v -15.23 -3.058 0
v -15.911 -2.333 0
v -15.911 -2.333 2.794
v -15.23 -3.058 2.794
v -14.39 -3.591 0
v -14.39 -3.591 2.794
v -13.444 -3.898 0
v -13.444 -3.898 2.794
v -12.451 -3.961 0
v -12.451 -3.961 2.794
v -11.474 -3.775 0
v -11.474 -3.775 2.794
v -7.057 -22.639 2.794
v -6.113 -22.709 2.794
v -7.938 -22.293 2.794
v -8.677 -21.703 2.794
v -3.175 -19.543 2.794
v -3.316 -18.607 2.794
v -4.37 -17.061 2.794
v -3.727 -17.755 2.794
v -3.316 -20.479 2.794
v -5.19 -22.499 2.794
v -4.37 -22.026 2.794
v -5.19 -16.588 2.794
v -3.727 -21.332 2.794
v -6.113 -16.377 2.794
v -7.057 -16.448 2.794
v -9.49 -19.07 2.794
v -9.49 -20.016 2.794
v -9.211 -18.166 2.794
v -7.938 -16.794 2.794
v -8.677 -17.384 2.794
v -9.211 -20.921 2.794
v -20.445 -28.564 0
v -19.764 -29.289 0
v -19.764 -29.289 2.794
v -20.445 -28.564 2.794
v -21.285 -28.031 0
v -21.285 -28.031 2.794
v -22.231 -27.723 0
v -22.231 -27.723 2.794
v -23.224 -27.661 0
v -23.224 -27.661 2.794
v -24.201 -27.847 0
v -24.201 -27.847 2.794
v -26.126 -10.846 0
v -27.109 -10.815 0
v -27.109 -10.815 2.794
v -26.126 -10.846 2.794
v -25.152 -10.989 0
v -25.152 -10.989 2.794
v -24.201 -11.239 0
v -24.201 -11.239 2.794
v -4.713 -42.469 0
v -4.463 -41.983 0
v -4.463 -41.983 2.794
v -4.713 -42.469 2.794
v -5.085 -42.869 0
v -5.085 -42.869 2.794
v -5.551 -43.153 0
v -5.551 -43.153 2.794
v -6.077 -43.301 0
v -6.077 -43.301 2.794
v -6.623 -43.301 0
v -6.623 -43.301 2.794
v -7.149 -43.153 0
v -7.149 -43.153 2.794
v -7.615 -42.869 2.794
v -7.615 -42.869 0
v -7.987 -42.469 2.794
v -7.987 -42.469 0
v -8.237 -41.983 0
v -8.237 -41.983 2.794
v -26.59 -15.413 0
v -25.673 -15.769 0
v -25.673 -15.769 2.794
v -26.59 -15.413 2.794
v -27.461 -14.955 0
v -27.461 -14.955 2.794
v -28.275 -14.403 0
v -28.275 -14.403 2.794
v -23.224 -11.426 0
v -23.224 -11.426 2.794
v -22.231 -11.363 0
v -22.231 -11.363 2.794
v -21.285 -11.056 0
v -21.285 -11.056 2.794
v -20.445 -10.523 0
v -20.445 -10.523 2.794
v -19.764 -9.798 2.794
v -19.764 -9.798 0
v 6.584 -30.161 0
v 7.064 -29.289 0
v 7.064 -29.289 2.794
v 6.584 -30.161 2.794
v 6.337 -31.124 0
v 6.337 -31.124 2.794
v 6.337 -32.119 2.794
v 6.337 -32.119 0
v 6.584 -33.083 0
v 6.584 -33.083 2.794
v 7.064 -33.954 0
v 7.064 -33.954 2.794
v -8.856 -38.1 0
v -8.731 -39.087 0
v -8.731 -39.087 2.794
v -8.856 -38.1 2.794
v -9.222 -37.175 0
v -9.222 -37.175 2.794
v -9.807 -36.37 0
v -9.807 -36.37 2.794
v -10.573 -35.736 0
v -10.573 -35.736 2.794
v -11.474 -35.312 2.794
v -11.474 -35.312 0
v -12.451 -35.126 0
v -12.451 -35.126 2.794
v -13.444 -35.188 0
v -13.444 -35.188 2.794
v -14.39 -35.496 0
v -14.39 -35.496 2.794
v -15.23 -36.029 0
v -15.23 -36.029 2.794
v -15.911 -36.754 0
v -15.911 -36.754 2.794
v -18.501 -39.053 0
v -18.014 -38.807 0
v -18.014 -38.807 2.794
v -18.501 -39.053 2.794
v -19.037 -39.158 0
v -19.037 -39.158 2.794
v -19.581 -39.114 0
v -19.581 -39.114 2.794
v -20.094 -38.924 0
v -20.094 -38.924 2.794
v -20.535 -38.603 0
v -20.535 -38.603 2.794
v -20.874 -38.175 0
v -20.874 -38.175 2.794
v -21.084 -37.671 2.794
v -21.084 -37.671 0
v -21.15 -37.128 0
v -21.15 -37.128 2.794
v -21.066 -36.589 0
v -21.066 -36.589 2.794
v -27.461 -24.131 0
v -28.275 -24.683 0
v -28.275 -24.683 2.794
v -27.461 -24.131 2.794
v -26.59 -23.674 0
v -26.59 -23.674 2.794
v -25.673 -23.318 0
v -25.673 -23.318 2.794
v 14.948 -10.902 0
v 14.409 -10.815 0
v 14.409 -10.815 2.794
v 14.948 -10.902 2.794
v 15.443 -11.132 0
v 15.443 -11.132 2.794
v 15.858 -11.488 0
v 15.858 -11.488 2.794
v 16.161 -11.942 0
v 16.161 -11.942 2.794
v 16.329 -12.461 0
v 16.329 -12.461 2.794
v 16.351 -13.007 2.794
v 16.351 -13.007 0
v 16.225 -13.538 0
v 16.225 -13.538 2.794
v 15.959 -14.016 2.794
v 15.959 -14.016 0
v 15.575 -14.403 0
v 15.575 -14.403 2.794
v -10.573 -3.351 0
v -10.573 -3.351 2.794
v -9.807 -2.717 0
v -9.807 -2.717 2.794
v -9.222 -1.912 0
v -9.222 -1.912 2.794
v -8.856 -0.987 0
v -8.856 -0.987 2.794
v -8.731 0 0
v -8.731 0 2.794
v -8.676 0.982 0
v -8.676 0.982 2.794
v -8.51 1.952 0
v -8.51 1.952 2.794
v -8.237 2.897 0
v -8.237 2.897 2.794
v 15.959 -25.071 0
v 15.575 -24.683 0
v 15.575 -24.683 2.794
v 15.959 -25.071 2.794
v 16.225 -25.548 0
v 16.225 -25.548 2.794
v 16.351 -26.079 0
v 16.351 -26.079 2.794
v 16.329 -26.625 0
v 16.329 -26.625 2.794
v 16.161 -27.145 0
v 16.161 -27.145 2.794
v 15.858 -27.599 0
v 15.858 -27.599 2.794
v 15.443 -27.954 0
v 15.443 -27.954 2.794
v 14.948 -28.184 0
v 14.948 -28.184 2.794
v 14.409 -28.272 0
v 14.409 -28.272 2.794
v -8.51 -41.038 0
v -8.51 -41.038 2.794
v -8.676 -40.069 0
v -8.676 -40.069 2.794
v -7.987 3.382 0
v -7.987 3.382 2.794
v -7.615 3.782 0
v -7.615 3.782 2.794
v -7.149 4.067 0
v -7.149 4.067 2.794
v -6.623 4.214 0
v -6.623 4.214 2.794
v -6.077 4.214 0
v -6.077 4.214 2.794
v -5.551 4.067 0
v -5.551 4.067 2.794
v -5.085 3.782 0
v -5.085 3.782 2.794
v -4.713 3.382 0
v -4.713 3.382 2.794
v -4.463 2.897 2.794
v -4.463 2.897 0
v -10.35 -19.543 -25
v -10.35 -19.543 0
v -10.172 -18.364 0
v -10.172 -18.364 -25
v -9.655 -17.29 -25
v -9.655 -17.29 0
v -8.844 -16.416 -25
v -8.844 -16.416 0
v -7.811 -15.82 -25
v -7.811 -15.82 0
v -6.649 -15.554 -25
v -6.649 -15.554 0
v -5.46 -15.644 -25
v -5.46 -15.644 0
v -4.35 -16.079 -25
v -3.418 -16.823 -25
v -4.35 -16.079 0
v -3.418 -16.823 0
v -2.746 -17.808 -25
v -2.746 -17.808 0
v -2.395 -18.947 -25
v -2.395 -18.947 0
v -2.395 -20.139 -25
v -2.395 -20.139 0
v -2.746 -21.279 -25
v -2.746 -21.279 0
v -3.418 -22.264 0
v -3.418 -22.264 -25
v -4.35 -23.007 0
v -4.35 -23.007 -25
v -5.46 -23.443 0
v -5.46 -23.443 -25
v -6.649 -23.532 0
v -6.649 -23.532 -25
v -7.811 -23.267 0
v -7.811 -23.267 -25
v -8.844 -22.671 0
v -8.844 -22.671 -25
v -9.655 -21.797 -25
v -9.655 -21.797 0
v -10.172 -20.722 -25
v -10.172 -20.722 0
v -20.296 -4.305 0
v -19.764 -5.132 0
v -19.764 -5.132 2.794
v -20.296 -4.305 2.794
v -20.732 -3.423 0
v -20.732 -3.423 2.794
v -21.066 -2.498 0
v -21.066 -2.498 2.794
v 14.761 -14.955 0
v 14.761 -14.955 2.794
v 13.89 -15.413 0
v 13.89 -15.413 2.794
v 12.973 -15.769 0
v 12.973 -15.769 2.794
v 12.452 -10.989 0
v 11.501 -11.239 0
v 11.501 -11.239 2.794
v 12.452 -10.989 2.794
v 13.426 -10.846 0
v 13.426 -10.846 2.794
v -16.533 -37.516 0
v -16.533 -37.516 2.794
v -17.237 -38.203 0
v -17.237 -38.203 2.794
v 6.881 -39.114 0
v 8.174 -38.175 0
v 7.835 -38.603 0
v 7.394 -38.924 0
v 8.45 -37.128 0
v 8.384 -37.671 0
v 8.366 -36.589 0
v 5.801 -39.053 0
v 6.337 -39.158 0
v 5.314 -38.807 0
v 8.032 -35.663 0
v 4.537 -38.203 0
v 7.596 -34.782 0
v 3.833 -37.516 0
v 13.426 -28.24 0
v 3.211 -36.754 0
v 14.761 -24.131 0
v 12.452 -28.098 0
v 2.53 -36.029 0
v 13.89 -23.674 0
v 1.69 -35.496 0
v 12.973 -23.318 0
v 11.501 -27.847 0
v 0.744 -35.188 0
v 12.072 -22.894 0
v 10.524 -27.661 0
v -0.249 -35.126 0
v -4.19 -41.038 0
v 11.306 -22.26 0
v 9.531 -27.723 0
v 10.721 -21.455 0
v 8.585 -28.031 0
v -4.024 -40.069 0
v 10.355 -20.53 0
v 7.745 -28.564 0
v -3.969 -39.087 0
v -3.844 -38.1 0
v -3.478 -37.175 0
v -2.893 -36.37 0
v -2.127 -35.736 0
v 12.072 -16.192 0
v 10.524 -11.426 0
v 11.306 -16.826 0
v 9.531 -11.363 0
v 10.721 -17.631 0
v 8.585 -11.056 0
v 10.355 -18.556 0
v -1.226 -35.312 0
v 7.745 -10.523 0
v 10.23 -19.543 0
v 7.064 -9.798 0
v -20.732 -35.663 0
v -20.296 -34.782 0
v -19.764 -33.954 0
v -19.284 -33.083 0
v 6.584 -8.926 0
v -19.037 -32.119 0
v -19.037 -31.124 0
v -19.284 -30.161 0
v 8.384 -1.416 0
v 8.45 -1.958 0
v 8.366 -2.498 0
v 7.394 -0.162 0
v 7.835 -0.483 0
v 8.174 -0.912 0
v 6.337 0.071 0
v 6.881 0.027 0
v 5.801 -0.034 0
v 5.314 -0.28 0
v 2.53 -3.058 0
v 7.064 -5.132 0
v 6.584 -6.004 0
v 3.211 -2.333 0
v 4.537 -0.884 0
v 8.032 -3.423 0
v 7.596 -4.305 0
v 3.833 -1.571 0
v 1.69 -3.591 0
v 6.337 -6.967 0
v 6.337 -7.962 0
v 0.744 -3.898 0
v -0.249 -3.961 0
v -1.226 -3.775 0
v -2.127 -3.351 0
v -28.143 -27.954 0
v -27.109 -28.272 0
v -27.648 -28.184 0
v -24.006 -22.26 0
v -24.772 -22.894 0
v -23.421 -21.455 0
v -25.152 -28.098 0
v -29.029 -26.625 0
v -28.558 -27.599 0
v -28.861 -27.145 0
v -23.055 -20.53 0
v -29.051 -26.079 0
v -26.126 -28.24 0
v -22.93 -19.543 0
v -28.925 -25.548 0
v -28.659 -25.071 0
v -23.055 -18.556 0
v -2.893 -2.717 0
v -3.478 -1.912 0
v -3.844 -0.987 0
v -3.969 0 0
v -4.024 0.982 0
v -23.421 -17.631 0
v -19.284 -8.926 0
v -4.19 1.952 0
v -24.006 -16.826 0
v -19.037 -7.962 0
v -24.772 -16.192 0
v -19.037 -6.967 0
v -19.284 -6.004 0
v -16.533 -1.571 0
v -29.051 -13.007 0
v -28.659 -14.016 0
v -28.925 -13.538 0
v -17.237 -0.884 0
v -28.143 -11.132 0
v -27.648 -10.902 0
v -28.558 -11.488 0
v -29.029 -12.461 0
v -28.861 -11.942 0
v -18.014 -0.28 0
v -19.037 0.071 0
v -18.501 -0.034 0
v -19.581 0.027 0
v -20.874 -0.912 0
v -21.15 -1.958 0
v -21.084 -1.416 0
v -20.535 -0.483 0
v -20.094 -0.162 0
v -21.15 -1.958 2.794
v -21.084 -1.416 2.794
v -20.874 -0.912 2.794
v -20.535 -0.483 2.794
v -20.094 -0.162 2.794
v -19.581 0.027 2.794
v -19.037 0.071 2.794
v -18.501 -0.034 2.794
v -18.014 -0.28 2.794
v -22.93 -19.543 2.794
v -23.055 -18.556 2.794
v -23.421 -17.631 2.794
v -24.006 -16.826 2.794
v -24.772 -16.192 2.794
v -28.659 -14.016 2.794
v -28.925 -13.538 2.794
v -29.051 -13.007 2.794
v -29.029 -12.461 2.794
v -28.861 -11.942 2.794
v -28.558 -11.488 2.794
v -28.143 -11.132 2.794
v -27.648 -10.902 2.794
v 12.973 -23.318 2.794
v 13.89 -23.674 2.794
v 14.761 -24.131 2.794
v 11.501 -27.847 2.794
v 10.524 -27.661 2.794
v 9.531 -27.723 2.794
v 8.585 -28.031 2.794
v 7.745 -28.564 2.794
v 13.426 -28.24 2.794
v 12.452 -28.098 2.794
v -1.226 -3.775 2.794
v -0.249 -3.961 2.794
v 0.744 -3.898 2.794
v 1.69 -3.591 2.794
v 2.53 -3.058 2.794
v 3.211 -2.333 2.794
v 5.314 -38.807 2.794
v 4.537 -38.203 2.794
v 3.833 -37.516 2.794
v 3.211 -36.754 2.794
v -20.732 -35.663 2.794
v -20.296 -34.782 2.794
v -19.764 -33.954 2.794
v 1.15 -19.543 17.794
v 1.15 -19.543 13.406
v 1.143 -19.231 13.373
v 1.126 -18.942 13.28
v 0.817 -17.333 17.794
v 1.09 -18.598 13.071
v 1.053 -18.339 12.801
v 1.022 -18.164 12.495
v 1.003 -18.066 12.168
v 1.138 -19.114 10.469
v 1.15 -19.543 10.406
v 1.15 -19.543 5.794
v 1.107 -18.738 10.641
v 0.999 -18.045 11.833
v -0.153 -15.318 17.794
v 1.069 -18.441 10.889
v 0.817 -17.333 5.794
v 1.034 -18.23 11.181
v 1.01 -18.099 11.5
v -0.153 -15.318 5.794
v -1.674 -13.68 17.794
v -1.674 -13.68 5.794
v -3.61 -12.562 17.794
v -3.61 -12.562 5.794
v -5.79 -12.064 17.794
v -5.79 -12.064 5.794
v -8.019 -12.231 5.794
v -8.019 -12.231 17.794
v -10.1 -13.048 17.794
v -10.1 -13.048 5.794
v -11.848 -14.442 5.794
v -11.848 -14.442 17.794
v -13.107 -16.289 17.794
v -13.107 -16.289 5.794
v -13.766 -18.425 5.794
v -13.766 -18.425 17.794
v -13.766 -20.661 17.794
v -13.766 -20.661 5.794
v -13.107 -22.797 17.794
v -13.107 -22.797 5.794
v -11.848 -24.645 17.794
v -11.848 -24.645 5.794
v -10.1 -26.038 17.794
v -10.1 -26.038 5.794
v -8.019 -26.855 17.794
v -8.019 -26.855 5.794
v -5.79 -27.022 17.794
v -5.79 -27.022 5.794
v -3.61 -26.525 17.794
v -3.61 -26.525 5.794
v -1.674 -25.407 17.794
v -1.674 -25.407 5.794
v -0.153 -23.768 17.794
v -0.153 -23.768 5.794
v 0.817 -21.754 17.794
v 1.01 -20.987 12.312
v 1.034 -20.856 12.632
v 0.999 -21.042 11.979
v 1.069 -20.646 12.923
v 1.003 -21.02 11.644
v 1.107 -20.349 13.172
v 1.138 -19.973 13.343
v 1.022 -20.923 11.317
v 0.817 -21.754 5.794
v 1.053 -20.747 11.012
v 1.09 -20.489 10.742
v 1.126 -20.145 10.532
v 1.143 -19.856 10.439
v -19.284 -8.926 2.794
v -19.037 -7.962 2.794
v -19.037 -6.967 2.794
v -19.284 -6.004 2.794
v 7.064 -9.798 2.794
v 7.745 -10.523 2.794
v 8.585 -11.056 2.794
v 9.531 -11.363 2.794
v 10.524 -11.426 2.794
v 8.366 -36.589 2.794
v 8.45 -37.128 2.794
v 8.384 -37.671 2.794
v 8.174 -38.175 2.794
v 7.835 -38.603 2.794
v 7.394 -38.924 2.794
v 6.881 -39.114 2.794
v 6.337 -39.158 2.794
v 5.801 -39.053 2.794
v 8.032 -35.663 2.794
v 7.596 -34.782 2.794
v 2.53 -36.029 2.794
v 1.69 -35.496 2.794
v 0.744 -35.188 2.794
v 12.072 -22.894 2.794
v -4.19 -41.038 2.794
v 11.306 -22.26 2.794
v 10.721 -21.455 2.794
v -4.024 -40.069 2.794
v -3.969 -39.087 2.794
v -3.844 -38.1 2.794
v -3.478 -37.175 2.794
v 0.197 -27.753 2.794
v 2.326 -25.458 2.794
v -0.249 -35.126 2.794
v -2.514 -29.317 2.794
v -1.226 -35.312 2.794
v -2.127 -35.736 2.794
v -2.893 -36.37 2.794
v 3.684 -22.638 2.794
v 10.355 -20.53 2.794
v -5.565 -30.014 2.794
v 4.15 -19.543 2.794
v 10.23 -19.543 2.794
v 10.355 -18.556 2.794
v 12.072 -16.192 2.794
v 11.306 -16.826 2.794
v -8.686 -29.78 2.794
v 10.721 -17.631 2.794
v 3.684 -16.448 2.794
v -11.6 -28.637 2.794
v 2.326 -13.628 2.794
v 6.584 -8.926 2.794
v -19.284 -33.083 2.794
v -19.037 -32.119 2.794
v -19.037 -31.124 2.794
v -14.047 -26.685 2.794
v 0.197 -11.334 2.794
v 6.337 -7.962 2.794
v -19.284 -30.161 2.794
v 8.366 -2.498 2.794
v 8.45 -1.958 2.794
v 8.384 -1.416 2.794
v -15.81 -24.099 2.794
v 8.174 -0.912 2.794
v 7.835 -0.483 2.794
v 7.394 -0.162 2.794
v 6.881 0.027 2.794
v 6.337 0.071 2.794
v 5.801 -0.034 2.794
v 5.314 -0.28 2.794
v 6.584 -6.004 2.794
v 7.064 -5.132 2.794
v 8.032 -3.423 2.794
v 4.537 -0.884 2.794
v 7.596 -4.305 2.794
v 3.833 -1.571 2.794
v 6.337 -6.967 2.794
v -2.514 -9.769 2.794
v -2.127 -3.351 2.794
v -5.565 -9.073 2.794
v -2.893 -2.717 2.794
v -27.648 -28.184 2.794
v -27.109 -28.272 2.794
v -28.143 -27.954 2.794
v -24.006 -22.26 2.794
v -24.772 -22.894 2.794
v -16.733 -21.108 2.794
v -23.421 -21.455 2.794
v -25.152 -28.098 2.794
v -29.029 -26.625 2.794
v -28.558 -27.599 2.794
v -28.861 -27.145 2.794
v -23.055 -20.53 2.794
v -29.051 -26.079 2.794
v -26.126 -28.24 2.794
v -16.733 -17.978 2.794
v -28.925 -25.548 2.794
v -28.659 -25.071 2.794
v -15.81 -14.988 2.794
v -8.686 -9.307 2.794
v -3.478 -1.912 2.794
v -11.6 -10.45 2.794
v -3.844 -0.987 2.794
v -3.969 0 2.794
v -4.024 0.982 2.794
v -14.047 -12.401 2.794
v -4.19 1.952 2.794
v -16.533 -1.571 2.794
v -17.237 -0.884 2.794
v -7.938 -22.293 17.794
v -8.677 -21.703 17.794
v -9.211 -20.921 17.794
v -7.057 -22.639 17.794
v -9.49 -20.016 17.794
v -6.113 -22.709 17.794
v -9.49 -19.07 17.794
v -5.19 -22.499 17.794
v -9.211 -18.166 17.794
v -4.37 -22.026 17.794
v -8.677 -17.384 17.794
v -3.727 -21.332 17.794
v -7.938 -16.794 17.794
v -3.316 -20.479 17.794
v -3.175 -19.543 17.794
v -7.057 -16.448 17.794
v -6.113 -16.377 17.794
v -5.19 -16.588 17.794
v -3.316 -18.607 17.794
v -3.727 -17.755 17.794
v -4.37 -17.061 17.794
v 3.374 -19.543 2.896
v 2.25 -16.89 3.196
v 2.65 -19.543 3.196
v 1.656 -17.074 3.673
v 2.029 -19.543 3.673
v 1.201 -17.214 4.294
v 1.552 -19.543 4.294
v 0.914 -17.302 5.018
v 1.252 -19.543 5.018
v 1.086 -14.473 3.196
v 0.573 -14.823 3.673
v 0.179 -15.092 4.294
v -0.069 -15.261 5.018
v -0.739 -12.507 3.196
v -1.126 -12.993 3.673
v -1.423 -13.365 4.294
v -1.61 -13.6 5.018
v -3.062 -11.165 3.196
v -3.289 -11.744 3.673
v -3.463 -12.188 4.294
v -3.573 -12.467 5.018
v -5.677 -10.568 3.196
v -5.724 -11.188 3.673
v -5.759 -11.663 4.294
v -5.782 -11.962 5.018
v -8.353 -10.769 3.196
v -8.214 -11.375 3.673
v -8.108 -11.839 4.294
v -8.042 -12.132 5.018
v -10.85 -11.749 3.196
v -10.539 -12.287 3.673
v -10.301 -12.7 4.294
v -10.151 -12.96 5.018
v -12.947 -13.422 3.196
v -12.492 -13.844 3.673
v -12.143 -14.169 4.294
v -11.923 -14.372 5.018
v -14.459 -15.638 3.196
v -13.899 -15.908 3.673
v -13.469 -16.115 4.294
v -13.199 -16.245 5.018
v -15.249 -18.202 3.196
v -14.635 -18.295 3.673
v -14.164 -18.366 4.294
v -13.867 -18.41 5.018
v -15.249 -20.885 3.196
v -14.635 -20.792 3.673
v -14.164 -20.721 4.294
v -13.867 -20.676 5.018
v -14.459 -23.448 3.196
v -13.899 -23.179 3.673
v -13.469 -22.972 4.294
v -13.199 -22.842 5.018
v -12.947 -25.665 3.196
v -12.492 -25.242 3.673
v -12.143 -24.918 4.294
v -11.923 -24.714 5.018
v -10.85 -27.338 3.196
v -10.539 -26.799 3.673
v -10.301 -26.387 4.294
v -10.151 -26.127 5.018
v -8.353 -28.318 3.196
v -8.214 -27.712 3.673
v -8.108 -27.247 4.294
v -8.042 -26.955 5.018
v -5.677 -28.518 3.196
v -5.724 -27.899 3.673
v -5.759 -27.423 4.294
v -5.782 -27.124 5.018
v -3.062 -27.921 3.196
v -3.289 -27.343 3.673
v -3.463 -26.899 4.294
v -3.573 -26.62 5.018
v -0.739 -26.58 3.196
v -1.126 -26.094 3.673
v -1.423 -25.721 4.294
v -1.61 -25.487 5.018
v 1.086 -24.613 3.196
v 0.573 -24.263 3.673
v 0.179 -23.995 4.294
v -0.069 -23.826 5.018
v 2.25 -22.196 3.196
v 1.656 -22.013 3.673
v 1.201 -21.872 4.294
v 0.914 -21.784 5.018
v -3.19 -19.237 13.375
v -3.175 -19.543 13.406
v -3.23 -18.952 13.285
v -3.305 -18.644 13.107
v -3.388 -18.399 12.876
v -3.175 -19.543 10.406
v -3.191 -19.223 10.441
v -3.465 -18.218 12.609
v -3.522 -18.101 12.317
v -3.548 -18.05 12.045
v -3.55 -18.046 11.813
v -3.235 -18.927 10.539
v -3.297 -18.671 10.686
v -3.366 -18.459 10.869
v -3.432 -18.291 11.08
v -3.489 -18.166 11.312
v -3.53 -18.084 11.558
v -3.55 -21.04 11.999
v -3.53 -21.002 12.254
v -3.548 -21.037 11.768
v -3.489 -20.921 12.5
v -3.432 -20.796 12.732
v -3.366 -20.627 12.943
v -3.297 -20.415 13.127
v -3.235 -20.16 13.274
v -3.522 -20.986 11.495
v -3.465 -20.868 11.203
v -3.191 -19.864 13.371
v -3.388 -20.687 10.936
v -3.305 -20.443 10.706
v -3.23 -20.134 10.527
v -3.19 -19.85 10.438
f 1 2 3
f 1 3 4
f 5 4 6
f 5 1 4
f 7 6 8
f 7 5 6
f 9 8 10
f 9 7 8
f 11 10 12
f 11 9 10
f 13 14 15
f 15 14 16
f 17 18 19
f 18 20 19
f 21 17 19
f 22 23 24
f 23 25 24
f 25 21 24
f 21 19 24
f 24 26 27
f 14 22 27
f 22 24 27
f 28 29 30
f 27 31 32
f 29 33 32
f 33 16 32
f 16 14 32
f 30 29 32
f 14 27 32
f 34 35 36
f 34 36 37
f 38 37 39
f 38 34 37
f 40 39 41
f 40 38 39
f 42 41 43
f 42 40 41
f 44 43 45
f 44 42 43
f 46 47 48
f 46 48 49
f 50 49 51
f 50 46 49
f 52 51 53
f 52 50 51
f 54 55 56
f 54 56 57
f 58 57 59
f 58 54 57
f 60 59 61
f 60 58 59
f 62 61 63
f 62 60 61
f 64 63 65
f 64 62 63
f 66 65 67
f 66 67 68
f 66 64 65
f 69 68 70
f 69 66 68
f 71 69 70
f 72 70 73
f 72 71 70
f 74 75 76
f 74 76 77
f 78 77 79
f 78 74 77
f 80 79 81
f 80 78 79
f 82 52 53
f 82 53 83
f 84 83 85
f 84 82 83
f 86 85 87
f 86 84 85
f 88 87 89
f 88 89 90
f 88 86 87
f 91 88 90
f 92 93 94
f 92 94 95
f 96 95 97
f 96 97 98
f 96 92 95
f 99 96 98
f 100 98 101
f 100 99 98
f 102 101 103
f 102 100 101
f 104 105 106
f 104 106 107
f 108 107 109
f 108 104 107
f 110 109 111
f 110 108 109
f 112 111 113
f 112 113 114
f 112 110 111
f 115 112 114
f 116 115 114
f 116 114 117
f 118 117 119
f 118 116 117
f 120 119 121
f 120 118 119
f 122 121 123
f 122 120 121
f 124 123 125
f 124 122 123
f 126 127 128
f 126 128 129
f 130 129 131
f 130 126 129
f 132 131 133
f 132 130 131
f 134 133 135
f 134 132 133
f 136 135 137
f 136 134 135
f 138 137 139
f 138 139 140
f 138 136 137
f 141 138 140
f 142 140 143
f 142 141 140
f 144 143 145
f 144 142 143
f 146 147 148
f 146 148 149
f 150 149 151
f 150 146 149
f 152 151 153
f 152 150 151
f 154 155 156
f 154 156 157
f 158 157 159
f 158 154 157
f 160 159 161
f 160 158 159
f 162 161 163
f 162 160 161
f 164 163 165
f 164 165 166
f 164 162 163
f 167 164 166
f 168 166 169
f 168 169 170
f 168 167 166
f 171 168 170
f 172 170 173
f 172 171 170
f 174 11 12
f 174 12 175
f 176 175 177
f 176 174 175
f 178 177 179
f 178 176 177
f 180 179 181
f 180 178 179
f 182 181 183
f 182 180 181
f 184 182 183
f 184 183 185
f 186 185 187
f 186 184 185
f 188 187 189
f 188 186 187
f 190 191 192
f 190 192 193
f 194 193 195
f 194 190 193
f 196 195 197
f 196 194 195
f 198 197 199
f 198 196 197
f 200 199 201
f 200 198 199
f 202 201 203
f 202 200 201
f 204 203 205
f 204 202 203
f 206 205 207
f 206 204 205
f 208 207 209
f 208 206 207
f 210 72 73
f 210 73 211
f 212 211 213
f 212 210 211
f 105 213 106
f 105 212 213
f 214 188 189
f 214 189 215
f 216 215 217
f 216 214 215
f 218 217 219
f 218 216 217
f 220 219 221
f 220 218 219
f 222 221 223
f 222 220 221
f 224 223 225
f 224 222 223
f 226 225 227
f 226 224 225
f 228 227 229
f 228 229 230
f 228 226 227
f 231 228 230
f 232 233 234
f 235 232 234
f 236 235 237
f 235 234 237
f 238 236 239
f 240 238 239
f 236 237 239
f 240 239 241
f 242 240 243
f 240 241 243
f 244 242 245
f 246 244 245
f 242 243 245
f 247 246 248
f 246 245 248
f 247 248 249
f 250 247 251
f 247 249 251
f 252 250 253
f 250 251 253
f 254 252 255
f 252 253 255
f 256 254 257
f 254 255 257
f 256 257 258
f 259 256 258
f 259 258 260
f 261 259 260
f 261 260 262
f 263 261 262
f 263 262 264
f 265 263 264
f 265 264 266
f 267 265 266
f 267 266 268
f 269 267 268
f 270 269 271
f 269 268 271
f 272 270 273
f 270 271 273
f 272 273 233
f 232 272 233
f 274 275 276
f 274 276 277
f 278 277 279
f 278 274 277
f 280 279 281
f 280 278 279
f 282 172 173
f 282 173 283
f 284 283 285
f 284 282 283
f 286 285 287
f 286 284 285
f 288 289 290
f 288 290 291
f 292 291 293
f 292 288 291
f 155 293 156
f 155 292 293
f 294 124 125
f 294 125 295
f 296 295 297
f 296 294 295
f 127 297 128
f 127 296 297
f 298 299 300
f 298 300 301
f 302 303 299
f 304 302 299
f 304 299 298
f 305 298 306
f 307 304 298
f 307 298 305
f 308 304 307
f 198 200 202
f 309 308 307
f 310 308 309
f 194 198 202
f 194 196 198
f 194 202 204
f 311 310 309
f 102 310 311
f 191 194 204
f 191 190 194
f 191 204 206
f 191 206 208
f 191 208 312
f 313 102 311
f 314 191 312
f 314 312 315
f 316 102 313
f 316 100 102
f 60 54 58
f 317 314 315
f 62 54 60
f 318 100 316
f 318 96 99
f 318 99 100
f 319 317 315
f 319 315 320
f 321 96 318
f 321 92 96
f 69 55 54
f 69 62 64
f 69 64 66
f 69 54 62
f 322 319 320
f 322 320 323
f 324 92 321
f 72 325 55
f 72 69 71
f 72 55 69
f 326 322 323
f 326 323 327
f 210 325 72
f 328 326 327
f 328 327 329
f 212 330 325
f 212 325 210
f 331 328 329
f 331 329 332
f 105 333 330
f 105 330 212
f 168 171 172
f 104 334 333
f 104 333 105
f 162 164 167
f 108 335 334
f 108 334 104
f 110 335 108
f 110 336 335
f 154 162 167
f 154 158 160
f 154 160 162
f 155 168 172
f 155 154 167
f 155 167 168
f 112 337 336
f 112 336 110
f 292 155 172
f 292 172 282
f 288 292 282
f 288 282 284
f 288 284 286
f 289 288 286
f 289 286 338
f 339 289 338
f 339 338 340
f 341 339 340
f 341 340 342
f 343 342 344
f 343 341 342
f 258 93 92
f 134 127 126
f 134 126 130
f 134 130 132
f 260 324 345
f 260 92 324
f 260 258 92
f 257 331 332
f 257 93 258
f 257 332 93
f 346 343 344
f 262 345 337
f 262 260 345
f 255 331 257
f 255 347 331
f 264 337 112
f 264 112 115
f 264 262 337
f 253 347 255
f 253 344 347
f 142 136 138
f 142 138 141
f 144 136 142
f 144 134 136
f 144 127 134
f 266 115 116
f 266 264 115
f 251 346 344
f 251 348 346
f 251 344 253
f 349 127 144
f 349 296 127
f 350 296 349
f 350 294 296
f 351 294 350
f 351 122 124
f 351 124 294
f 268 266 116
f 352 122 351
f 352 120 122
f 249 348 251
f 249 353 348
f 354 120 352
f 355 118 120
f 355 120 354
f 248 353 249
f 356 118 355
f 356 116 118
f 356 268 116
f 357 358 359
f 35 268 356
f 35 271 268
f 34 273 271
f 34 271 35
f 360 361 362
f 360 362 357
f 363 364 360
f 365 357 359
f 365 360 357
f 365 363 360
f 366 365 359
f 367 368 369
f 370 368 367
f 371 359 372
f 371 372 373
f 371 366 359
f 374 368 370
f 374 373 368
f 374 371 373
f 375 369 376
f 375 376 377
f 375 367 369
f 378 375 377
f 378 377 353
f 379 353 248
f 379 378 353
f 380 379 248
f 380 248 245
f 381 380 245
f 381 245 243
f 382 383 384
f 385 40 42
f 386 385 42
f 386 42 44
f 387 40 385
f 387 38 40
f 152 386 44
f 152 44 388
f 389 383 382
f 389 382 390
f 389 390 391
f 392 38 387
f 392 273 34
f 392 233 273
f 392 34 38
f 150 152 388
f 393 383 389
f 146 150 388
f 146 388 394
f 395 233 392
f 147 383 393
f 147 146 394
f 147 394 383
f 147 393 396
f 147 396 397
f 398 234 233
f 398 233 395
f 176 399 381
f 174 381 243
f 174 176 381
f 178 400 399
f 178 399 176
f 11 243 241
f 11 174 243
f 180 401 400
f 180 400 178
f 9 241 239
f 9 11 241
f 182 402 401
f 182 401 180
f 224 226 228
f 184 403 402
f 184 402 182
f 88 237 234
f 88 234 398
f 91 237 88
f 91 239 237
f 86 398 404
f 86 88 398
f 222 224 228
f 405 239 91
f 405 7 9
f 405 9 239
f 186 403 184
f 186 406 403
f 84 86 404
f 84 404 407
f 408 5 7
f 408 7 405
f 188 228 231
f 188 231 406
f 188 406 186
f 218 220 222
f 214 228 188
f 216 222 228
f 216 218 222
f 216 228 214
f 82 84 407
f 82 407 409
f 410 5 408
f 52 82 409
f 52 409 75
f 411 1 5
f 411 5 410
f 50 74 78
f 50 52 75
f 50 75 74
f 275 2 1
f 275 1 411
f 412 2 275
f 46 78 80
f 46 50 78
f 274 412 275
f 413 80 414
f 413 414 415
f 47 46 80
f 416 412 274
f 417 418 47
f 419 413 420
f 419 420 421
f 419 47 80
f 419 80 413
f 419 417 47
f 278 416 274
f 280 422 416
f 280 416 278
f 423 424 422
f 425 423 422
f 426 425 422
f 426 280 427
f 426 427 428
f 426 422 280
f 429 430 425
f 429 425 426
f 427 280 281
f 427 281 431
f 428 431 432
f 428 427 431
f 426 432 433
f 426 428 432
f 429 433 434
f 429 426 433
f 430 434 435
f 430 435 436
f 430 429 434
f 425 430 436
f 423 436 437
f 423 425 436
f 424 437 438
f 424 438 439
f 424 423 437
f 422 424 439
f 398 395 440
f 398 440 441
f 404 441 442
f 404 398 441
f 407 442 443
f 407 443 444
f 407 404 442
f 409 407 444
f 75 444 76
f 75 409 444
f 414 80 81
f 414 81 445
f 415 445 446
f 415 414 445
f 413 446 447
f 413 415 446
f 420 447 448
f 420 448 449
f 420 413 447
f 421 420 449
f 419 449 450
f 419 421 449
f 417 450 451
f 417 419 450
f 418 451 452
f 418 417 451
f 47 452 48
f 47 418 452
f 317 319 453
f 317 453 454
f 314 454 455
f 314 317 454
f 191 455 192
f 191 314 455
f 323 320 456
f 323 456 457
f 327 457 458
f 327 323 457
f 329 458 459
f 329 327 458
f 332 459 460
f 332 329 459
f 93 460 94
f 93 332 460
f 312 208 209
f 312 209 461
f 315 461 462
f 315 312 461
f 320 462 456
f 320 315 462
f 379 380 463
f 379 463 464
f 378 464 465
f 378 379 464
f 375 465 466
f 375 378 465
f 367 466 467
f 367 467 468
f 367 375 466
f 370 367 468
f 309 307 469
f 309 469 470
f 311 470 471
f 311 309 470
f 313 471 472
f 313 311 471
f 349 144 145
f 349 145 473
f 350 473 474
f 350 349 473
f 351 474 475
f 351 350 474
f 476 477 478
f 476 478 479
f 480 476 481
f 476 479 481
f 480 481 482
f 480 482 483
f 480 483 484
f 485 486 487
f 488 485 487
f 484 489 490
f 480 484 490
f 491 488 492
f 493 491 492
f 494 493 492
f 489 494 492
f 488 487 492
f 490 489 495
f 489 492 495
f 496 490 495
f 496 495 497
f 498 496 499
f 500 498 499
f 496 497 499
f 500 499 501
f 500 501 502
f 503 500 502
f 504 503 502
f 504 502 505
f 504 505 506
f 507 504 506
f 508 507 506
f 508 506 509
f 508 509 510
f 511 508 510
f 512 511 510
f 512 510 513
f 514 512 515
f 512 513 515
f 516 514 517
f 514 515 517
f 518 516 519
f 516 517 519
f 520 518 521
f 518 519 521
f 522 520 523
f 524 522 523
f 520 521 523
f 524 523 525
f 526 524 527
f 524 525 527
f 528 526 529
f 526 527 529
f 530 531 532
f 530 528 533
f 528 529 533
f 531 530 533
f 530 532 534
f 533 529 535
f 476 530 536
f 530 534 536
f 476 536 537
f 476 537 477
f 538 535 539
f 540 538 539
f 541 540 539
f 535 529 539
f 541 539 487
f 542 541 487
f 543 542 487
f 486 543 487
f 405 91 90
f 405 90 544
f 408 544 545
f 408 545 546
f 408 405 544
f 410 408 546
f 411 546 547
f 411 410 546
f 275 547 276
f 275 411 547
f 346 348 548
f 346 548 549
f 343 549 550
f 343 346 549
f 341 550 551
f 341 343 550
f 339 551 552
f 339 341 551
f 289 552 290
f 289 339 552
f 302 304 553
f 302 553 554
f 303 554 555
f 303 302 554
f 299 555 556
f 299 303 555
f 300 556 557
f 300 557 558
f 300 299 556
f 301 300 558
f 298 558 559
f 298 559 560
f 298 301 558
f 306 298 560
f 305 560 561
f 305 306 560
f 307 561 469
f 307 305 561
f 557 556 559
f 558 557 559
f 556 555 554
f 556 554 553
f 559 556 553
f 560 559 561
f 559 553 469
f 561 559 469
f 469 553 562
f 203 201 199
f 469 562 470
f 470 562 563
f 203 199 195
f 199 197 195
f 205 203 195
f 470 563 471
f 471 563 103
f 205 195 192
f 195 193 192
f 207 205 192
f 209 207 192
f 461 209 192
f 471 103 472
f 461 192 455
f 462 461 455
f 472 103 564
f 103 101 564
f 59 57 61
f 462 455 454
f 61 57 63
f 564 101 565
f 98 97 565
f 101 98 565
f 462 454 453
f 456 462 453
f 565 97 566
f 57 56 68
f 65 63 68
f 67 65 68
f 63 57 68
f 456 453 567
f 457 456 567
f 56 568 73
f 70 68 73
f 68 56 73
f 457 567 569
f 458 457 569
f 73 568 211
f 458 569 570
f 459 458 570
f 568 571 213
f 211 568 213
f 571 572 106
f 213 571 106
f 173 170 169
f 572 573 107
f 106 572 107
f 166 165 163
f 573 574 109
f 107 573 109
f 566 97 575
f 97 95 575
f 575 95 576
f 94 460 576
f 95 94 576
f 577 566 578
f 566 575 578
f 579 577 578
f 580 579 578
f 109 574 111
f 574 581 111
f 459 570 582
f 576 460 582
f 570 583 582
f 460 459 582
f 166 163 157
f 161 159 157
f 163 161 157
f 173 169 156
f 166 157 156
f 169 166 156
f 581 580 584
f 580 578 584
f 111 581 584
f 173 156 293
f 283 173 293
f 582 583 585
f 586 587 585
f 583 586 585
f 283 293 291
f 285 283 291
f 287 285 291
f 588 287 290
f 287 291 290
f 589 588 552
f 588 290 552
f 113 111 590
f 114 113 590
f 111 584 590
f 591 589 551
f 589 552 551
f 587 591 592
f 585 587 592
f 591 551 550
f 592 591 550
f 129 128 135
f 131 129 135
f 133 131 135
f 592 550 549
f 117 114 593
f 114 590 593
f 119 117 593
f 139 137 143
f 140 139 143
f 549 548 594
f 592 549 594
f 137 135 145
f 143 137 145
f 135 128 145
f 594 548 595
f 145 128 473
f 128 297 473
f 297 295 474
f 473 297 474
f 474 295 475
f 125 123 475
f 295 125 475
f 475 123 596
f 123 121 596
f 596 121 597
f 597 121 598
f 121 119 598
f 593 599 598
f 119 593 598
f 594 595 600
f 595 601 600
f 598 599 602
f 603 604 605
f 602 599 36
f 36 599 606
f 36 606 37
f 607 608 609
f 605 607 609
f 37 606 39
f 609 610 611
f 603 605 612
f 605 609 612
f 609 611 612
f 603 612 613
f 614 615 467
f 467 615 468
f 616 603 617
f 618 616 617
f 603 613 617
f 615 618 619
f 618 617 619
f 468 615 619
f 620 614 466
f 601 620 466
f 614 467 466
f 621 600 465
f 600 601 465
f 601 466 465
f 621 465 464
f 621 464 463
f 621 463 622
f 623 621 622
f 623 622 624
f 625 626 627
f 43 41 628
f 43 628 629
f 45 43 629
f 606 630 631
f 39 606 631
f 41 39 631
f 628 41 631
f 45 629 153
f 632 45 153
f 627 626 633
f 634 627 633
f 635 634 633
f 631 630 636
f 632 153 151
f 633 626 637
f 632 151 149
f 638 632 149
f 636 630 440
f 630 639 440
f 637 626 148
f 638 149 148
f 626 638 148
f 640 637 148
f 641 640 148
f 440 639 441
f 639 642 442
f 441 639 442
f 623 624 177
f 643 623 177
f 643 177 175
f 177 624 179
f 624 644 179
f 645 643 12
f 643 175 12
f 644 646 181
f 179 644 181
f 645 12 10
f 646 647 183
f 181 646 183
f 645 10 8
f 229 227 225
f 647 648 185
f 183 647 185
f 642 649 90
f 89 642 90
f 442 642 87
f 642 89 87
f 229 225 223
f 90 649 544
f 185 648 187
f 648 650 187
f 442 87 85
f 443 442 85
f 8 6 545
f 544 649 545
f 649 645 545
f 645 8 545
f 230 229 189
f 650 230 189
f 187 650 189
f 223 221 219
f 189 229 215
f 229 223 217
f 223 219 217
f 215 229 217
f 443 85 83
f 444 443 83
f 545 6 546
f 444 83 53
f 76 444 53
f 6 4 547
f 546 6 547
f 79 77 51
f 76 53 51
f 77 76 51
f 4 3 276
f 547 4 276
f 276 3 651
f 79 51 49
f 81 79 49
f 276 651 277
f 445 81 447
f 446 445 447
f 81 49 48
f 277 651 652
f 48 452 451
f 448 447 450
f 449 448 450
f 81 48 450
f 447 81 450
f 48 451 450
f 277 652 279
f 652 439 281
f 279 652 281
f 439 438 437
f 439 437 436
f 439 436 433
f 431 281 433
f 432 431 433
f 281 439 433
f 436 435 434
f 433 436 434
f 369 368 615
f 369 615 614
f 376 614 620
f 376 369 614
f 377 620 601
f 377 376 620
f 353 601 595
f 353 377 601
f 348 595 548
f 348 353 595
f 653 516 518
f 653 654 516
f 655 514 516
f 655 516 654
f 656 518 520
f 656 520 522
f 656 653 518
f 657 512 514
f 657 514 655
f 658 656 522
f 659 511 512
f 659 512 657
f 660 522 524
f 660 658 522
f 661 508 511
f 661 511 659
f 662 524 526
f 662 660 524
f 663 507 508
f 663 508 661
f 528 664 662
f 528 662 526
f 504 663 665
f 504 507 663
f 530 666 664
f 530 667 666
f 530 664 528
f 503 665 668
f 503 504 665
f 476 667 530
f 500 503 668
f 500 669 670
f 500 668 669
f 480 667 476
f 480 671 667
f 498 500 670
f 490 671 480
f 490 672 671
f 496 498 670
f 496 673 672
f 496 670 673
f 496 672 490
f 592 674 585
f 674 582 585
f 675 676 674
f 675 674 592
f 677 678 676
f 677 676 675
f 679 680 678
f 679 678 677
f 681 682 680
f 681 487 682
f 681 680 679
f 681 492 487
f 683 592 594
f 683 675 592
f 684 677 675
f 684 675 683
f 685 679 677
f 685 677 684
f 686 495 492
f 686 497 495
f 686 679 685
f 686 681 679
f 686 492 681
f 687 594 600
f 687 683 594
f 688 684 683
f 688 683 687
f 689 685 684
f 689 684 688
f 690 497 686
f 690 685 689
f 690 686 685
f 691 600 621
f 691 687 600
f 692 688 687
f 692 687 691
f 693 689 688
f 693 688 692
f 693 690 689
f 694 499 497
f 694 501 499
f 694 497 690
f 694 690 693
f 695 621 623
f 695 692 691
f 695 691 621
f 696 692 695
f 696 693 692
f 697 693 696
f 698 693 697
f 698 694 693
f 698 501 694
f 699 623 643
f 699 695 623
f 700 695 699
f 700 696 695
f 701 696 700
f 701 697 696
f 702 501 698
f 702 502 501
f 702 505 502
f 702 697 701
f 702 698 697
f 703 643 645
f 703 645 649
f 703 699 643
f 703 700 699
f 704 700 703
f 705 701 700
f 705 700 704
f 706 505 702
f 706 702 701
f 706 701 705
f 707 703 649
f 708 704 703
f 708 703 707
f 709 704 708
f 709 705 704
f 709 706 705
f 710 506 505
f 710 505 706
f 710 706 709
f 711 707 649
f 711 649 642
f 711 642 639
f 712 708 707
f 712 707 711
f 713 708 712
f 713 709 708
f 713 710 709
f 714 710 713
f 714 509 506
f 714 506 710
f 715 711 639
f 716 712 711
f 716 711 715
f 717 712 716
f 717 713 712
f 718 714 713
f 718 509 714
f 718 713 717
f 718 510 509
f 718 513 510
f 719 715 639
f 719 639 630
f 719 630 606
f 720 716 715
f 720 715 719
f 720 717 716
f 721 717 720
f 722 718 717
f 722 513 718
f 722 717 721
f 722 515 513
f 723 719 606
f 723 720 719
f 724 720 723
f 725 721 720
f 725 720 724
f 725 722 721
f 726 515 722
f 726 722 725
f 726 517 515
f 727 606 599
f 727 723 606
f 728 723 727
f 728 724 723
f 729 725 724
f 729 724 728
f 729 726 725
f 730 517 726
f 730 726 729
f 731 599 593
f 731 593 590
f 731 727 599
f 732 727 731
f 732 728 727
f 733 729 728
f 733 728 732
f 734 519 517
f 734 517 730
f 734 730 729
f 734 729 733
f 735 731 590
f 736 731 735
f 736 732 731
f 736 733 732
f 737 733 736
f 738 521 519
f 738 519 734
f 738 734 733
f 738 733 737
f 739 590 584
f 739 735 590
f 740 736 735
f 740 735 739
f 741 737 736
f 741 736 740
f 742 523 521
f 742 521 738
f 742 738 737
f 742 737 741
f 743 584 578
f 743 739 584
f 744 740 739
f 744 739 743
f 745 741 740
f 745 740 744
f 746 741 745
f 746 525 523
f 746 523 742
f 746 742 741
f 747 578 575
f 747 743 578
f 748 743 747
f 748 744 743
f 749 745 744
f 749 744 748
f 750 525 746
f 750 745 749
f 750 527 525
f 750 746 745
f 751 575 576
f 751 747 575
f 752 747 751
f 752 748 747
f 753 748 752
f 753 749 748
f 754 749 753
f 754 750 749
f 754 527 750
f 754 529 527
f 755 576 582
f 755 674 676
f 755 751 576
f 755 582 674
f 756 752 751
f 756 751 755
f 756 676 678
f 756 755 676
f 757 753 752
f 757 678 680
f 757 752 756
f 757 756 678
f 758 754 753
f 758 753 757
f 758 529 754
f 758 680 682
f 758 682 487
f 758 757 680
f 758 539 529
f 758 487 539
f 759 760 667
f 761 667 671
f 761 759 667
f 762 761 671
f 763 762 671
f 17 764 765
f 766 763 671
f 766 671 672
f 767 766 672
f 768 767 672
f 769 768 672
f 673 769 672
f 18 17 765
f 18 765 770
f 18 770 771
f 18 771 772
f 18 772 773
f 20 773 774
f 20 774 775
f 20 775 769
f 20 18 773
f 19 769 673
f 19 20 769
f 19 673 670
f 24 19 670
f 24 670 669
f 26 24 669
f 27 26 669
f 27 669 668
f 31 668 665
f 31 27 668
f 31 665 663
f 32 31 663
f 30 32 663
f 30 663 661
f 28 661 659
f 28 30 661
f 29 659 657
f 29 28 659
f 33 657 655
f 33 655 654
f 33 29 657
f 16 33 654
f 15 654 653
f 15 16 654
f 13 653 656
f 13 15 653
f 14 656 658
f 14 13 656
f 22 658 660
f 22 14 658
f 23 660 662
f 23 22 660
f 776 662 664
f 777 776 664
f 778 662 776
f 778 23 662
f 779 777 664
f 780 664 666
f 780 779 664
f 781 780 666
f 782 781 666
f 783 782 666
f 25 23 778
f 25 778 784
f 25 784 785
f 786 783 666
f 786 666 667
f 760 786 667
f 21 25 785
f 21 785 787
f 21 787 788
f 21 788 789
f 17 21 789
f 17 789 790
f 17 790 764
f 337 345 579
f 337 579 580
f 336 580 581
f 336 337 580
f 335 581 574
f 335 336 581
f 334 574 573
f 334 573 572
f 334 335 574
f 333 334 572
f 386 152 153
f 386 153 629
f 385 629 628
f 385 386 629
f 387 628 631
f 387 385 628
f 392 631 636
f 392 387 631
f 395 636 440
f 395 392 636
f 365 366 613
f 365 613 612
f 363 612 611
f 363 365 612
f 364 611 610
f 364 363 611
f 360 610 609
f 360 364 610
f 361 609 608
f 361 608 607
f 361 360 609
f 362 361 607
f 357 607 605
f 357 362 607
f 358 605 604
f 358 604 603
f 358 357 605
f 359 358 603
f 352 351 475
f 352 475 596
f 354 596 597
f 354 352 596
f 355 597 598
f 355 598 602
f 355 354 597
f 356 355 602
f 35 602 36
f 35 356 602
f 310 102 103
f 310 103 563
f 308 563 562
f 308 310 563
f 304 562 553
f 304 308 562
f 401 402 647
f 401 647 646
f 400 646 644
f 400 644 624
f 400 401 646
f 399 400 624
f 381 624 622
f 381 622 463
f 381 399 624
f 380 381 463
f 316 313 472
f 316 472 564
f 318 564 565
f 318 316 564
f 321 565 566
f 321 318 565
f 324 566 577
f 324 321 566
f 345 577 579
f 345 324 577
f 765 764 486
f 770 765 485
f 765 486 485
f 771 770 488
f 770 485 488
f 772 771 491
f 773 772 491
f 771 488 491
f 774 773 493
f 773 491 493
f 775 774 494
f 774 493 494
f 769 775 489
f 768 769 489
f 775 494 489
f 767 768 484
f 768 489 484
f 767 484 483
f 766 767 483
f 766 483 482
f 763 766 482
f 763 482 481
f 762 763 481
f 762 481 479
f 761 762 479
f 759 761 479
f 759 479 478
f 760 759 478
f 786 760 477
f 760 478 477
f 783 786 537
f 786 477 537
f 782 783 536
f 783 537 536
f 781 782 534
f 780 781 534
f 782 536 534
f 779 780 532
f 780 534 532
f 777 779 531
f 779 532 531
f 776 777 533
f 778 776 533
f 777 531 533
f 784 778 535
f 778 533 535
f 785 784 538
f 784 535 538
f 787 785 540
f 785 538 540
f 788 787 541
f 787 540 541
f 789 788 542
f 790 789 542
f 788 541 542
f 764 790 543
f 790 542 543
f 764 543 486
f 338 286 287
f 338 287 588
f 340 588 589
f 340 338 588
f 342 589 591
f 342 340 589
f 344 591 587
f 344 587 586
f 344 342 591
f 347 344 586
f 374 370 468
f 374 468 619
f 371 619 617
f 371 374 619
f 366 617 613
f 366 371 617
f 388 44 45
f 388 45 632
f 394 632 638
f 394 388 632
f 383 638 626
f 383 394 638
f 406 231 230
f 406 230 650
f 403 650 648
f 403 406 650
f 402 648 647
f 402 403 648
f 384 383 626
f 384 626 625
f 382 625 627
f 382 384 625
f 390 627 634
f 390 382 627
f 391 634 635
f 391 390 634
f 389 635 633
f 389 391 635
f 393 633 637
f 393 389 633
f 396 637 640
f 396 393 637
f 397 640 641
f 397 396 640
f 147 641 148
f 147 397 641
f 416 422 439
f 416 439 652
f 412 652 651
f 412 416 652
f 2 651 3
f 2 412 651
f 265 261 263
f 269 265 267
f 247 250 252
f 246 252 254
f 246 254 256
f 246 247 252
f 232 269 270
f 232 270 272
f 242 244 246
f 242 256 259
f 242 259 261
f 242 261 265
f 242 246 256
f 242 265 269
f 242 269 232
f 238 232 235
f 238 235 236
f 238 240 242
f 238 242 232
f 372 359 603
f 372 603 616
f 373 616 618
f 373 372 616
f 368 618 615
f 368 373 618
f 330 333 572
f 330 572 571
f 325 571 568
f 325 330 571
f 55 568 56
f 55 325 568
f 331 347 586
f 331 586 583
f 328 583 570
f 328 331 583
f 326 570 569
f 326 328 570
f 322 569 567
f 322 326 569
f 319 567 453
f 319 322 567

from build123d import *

# Parameters (mm, degrees)
BOSS_EXTRUDE1_DEPTH = 2.794
SKETCH3_R           = 7.5
SKETCH3_R_2         = 3.175
BOSS_EXTRUDE2_DEPTH = 15
FILLET1_R           = 3
SKETCH4_R           = 1.5
CUT_EXTRUDE1_DEPTH  = 7.5
SKETCH5_R           = 4
BOSS_EXTRUDE3_DEPTH = 25


with BuildPart() as part:
    # Sketch2 → Boss-Extrude1 (new body)
    with BuildSketch(Plane.XY):
        with BuildLine():
            ThreePointArc((-8.73125, 0), (-8.606730181, 1.469327109), (-8.236722377, 2.896744905))
            ThreePointArc((-8.236722377, 2.896744905), (-6.35, 4.233209924), (-4.463277623, 2.896744905))
            ThreePointArc((-4.463277623, 2.896744905), (-4.093269819, 1.469327109), (-3.96875, 0))
            ThreePointArc((-3.96875, 0), (-3.210786196, -2.33277272), (-1.226411196, -3.774505549))
            ThreePointArc((-1.226411196, -3.774505549), (1.226411196, -3.774505549), (3.210786196, -2.33277272))
            ThreePointArc((3.210786196, -2.33277272), (4.175173652, -1.217253032), (5.313531383, -0.279932907))
            ThreePointArc((5.313531383, -0.279932907), (7.625476277, -0.307697583), (8.366312316, -2.497908084))
            ThreePointArc((8.366312316, -2.497908084), (7.826639788, -3.870198469), (7.063729632, -5.132099984))
            ThreePointArc((7.063729632, -5.132099984), (6.305765829, -7.464872704), (7.063729632, -9.797645424))
            ThreePointArc((7.063729632, -9.797645424), (9.048104632, -11.239378253), (11.500927025, -11.239378253))
            ThreePointArc((11.500927025, -11.239378253), (12.936818887, -10.903756591), (14.408712583, -10.814558567))
            ThreePointArc((14.408712583, -10.814558567), (16.262795625, -12.195947775), (15.574771139, -14.403317789))
            ThreePointArc((15.574771139, -14.403317789), (14.331554842, -15.19631248), (12.972620461, -15.768784912))
            ThreePointArc((12.972620461, -15.768784912), (10.988245461, -17.210517741), (10.230281657, -19.543290461))
            ThreePointArc((10.230281657, -19.543290461), (10.988245461, -21.876063181), (12.972620461, -23.31779601))
            ThreePointArc((12.972620461, -23.31779601), (14.331554842, -23.890268442), (15.574771139, -24.683263133))
            ThreePointArc((15.574771139, -24.683263133), (16.262795625, -26.890633147), (14.408712583, -28.272022355))
            ThreePointArc((14.408712583, -28.272022355), (12.936818887, -28.182824331), (11.500927025, -27.847202669))
            ThreePointArc((11.500927025, -27.847202669), (9.048104632, -27.847202669), (7.063729632, -29.288935498))
            ThreePointArc((7.063729632, -29.288935498), (6.305765829, -31.621708218), (7.063729632, -33.954480938))
            ThreePointArc((7.063729632, -33.954480938), (7.826639788, -35.216382453), (8.366312316, -36.588672839))
            ThreePointArc((8.366312316, -36.588672839), (7.625476277, -38.778883339), (5.313531383, -38.806648015))
            ThreePointArc((5.313531383, -38.806648015), (4.175173652, -37.869327891), (3.210786196, -36.753808202))
            ThreePointArc((3.210786196, -36.753808202), (1.226411196, -35.312075373), (-1.226411196, -35.312075373))
            ThreePointArc((-1.226411196, -35.312075373), (-3.210786196, -36.753808202), (-3.96875, -39.086580922))
            ThreePointArc((-3.96875, -39.086580922), (-4.093269819, -40.555908031), (-4.463277623, -41.983325828))
            ThreePointArc((-4.463277623, -41.983325828), (-6.35, -43.319790846), (-8.236722377, -41.983325828))
            ThreePointArc((-8.236722377, -41.983325828), (-8.606730181, -40.555908031), (-8.73125, -39.086580922))
            ThreePointArc((-8.73125, -39.086580922), (-9.489213804, -36.753808202), (-11.473588804, -35.312075373))
            ThreePointArc((-11.473588804, -35.312075373), (-13.926411196, -35.312075373), (-15.910786196, -36.753808202))
            ThreePointArc((-15.910786196, -36.753808202), (-16.875173652, -37.869327891), (-18.013531383, -38.806648015))
            ThreePointArc((-18.013531383, -38.806648015), (-20.325476277, -38.778883339), (-21.066312316, -36.588672839))
            ThreePointArc((-21.066312316, -36.588672839), (-20.526639788, -35.216382453), (-19.763729632, -33.954480938))
            ThreePointArc((-19.763729632, -33.954480938), (-19.005765829, -31.621708218), (-19.763729632, -29.288935498))
            ThreePointArc((-19.763729632, -29.288935498), (-21.748104632, -27.847202669), (-24.200927025, -27.847202669))
            ThreePointArc((-24.200927025, -27.847202669), (-25.636818887, -28.182824331), (-27.108712583, -28.272022355))
            ThreePointArc((-27.108712583, -28.272022355), (-28.962795625, -26.890633147), (-28.274771139, -24.683263133))
            ThreePointArc((-28.274771139, -24.683263133), (-27.031554842, -23.890268442), (-25.672620461, -23.31779601))
            ThreePointArc((-25.672620461, -23.31779601), (-23.688245461, -21.876063181), (-22.930281657, -19.543290461))
            ThreePointArc((-22.930281657, -19.543290461), (-23.688245461, -17.210517741), (-25.672620461, -15.768784912))
            ThreePointArc((-25.672620461, -15.768784912), (-27.031554842, -15.19631248), (-28.274771139, -14.403317789))
            ThreePointArc((-28.274771139, -14.403317789), (-28.962795625, -12.195947775), (-27.108712583, -10.814558567))
            ThreePointArc((-27.108712583, -10.814558567), (-25.636818887, -10.903756591), (-24.200927025, -11.239378253))
            ThreePointArc((-24.200927025, -11.239378253), (-21.748104632, -11.239378253), (-19.763729632, -9.797645424))
            ThreePointArc((-19.763729632, -9.797645424), (-19.005765829, -7.464872704), (-19.763729632, -5.132099984))
            ThreePointArc((-19.763729632, -5.132099984), (-20.526639788, -3.870198469), (-21.066312316, -2.497908084))
            ThreePointArc((-21.066312316, -2.497908084), (-20.325476277, -0.307697583), (-18.013531383, -0.279932907))
            ThreePointArc((-18.013531383, -0.279932907), (-16.875173652, -1.217253032), (-15.910786196, -2.33277272))
            ThreePointArc((-15.910786196, -2.33277272), (-13.926411196, -3.774505549), (-11.473588804, -3.774505549))
            ThreePointArc((-11.473588804, -3.774505549), (-9.489213804, -2.33277272), (-8.73125, 0))
        make_face()
    extrude(amount=BOSS_EXTRUDE1_DEPTH)

    # Sketch3 → Boss-Extrude2 (add)
    with BuildSketch(Plane.XY.offset(2.794)):
        with Locations((-6.35, -19.543290461)):
            Circle(SKETCH3_R)
        with Locations((-6.35, -19.543290461)):
            Circle(SKETCH3_R_2, mode=Mode.SUBTRACT)
    extrude(amount=BOSS_EXTRUDE2_DEPTH)

    # Fillet1
    fillet1_edges = [part.edges().sort_by_distance(p)[0] for p in [
        (-13.85, -19.543290461, 2.794),
    ]]
    fillet(fillet1_edges, radius=FILLET1_R)

    # Sketch4 → Cut-Extrude1 (cut, symmetric)
    with BuildSketch(Plane(origin=(0, 0, 0), x_dir=(0, 0, -1), z_dir=(1, 0, 0))):
        with Locations((-11.906147171, -19.543290461)):
            Circle(SKETCH4_R)
    extrude(amount=CUT_EXTRUDE1_DEPTH, both=True, mode=Mode.SUBTRACT)

    # Sketch5 → Boss-Extrude3 (add)
    with BuildSketch(Plane(origin=(0, 0, 0), x_dir=(-1, 0, 0), z_dir=(0, 0, -1))):
        with Locations((6.35, -19.543290461)):
            Circle(SKETCH5_R)
    extrude(amount=BOSS_EXTRUDE3_DEPTH)


solid = part.part
